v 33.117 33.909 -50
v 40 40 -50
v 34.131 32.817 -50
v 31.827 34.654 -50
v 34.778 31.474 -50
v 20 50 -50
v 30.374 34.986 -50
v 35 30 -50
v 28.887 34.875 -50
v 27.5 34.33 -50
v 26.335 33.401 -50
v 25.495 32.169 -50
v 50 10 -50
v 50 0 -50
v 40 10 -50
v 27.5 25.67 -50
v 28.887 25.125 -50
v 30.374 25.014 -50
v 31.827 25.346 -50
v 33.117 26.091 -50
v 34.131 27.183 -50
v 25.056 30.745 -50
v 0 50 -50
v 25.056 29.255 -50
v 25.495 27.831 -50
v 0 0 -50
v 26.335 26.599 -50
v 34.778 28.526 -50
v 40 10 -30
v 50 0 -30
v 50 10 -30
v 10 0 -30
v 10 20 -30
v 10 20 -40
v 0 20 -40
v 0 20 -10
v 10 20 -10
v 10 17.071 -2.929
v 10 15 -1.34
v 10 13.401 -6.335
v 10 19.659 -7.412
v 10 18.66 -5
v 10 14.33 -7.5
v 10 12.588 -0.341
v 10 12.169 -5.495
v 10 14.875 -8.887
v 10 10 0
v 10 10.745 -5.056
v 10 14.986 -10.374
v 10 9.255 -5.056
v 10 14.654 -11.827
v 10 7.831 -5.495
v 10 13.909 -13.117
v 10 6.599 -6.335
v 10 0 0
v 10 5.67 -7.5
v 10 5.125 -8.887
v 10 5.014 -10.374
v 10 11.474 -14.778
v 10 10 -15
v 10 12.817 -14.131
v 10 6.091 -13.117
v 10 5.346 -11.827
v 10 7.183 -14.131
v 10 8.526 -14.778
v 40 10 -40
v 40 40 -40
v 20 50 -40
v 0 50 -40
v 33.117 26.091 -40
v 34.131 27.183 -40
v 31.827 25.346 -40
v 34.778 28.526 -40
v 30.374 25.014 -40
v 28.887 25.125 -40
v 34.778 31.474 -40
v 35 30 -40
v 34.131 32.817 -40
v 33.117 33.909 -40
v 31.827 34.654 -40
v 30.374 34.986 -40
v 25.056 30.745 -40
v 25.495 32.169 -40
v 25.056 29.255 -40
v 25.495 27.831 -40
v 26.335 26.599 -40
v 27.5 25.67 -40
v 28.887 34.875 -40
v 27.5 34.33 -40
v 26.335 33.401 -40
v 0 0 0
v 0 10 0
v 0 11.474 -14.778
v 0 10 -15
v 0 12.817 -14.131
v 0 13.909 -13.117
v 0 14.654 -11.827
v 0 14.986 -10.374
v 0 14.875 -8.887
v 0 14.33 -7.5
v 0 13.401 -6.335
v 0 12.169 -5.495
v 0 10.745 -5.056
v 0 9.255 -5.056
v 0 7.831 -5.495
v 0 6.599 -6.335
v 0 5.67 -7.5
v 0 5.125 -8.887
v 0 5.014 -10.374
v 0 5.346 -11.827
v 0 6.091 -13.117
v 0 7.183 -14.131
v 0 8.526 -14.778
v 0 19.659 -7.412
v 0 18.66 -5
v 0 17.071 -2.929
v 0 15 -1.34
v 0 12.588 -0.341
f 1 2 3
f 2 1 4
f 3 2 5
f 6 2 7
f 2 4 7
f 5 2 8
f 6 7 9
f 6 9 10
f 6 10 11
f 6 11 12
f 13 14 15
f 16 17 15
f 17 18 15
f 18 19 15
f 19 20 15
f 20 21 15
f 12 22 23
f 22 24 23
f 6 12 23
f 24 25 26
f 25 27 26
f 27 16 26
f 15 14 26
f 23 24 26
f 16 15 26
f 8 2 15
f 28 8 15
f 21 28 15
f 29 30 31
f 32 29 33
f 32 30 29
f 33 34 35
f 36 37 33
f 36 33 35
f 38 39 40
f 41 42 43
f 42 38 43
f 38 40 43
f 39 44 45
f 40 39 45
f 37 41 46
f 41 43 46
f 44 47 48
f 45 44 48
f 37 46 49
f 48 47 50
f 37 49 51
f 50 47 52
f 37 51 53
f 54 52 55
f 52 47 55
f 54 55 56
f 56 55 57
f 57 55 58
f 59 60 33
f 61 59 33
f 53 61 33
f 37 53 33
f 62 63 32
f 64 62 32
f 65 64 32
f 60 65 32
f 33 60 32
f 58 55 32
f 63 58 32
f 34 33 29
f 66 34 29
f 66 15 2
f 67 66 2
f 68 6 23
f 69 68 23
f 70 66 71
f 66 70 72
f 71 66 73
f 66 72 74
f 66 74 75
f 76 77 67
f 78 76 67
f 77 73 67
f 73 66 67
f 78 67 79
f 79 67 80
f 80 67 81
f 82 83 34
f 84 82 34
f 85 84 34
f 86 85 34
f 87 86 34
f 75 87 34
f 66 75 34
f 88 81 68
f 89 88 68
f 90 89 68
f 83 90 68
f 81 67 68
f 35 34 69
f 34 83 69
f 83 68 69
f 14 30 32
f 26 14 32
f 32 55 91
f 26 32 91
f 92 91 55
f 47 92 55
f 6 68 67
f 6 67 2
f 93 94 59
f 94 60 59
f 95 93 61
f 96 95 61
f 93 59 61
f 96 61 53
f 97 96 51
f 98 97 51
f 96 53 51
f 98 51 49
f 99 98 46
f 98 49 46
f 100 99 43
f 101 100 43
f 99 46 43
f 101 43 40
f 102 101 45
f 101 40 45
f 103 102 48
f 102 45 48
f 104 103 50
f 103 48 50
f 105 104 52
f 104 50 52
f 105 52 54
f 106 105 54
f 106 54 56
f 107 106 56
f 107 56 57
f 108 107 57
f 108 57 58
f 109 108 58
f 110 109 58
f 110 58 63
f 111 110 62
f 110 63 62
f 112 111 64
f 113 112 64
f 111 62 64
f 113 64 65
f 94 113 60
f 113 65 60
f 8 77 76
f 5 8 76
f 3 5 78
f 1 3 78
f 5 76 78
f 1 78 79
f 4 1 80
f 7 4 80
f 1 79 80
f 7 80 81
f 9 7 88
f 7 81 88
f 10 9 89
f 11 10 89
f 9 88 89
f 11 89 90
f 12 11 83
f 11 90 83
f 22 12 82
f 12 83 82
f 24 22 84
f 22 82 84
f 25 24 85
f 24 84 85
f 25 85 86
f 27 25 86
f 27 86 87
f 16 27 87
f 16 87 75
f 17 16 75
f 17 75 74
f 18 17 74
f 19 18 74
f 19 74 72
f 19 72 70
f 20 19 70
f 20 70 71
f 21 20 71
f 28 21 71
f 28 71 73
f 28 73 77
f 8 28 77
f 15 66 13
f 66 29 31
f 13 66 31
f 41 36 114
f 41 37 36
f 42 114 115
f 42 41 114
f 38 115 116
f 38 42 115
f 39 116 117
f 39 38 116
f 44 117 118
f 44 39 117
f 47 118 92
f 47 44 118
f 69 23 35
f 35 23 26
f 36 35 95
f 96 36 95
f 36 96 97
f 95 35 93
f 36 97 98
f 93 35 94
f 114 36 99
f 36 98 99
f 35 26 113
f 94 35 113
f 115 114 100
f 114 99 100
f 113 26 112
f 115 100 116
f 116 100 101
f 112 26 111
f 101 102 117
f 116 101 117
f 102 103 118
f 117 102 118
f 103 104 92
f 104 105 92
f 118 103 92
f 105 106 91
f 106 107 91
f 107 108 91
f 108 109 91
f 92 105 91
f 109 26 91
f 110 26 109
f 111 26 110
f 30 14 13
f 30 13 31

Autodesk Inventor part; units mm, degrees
ref_plane "YZ Plane" through (0, 0, 0) normal (1, 0, 0) x (0, 1, 0)
ref_plane "XZ Plane" through (0, 0, 0) normal (0, 1, 0) x (-1, 0, 0)
ref_plane "XY Plane" through (0, 0, 0) normal (0, 0, 1) x (1, 0, 0)
sketch "草圖1" plane through (0, 0, 0) normal (0, 1, 0) x (-1, 0, 0)
  line L0 (0, 0) -> (-10, 0)
  line L1 (-10, 0) -> (-10, -50)
  line L2 (-10, -50) -> (0, -50)
  line L3 (0, -50) -> (0, 0)
  line L4 (-10, -50) -> (-50, -50)
  line L5 (-50, -50) -> (-50, -30)
  line L6 (-50, -30) -> (-10, -30)
  line L7 (-10, -30) -> (-10, -50)
  dimension "d0" = 20
  dimension "d1" = 10
  dimension "d2" = 50
  dimension "d3" = 40
extrude "擠出1" add sketch "草圖1" along normal blind 20
sketch "草圖2" plane through (10, 0, -30) normal (0, 0, 1) x (1, 0, 0)
  line L0 (0, 0) -> (0, 20) projected
  line L1 (0, 20) -> (30, 10)
  line L2 (30, 10) -> (42.5125, 10)
  line L3 (0, 0) -> (40, 0) projected
  line L4 (0, 20) -> (41.4864, 29.1876)
  line L5 (41.4864, 29.1876) -> (42.5125, 10)
  point P0 (-10, 0)
  dimension "d6" = 10
  dimension "d7" = 30
extrude "擠出2" cut sketch "草圖2" against normal through all
sketch "草圖3" plane through (50, 0, -50) normal (0, 0, -1) x (-1, 0, 0)
  line L0 (50, 0) -> (10, 0)
  line L1 (10, 0) -> (10, 50)
  line L2 (10, 50) -> (50, 50)
  line L3 (50, 50) -> (50, 0)
  dimension "d12" = 40
  dimension "d13" = 50
extrude "擠出3" add sketch "草圖3" against normal blind 10
chamfer "倒角1" distance 10 distance2 20 1 edges at (40, 50, -45) measured on face at (40, 23.3333, -46.6667)
fillet "圓角1" radius 10 1 edges at (5, 20, 0)
sketch "草圖4" plane through (10, 0, 0) normal (1, 0, 0) x (0, 0, -1)
  circle A0 centre (10, 10) radius 5
  line L0 (0, 0) -> (30, 0) projected
  line L1 (0, 0) -> (0, 10) projected
  dimension "d20" = 10
  dimension "d21" = 10
  dimension "d22" = 10
extrude "擠出4" cut sketch "草圖4" against normal blind 10
sketch "草圖5" plane through (50, 0, -40) normal (0, 0, 1) x (1, 0, 0)
  circle A0 centre (-20, 30) radius 5
  line L0 (-10, 10) -> (-10, 40) projected
  point P0 (-50, 0)
  dimension "d25" = 10
  dimension "d26" = 10
  dimension "d27" = 10
extrude "擠出5" cut sketch "草圖5" against normal blind 10
properties part number "30"
